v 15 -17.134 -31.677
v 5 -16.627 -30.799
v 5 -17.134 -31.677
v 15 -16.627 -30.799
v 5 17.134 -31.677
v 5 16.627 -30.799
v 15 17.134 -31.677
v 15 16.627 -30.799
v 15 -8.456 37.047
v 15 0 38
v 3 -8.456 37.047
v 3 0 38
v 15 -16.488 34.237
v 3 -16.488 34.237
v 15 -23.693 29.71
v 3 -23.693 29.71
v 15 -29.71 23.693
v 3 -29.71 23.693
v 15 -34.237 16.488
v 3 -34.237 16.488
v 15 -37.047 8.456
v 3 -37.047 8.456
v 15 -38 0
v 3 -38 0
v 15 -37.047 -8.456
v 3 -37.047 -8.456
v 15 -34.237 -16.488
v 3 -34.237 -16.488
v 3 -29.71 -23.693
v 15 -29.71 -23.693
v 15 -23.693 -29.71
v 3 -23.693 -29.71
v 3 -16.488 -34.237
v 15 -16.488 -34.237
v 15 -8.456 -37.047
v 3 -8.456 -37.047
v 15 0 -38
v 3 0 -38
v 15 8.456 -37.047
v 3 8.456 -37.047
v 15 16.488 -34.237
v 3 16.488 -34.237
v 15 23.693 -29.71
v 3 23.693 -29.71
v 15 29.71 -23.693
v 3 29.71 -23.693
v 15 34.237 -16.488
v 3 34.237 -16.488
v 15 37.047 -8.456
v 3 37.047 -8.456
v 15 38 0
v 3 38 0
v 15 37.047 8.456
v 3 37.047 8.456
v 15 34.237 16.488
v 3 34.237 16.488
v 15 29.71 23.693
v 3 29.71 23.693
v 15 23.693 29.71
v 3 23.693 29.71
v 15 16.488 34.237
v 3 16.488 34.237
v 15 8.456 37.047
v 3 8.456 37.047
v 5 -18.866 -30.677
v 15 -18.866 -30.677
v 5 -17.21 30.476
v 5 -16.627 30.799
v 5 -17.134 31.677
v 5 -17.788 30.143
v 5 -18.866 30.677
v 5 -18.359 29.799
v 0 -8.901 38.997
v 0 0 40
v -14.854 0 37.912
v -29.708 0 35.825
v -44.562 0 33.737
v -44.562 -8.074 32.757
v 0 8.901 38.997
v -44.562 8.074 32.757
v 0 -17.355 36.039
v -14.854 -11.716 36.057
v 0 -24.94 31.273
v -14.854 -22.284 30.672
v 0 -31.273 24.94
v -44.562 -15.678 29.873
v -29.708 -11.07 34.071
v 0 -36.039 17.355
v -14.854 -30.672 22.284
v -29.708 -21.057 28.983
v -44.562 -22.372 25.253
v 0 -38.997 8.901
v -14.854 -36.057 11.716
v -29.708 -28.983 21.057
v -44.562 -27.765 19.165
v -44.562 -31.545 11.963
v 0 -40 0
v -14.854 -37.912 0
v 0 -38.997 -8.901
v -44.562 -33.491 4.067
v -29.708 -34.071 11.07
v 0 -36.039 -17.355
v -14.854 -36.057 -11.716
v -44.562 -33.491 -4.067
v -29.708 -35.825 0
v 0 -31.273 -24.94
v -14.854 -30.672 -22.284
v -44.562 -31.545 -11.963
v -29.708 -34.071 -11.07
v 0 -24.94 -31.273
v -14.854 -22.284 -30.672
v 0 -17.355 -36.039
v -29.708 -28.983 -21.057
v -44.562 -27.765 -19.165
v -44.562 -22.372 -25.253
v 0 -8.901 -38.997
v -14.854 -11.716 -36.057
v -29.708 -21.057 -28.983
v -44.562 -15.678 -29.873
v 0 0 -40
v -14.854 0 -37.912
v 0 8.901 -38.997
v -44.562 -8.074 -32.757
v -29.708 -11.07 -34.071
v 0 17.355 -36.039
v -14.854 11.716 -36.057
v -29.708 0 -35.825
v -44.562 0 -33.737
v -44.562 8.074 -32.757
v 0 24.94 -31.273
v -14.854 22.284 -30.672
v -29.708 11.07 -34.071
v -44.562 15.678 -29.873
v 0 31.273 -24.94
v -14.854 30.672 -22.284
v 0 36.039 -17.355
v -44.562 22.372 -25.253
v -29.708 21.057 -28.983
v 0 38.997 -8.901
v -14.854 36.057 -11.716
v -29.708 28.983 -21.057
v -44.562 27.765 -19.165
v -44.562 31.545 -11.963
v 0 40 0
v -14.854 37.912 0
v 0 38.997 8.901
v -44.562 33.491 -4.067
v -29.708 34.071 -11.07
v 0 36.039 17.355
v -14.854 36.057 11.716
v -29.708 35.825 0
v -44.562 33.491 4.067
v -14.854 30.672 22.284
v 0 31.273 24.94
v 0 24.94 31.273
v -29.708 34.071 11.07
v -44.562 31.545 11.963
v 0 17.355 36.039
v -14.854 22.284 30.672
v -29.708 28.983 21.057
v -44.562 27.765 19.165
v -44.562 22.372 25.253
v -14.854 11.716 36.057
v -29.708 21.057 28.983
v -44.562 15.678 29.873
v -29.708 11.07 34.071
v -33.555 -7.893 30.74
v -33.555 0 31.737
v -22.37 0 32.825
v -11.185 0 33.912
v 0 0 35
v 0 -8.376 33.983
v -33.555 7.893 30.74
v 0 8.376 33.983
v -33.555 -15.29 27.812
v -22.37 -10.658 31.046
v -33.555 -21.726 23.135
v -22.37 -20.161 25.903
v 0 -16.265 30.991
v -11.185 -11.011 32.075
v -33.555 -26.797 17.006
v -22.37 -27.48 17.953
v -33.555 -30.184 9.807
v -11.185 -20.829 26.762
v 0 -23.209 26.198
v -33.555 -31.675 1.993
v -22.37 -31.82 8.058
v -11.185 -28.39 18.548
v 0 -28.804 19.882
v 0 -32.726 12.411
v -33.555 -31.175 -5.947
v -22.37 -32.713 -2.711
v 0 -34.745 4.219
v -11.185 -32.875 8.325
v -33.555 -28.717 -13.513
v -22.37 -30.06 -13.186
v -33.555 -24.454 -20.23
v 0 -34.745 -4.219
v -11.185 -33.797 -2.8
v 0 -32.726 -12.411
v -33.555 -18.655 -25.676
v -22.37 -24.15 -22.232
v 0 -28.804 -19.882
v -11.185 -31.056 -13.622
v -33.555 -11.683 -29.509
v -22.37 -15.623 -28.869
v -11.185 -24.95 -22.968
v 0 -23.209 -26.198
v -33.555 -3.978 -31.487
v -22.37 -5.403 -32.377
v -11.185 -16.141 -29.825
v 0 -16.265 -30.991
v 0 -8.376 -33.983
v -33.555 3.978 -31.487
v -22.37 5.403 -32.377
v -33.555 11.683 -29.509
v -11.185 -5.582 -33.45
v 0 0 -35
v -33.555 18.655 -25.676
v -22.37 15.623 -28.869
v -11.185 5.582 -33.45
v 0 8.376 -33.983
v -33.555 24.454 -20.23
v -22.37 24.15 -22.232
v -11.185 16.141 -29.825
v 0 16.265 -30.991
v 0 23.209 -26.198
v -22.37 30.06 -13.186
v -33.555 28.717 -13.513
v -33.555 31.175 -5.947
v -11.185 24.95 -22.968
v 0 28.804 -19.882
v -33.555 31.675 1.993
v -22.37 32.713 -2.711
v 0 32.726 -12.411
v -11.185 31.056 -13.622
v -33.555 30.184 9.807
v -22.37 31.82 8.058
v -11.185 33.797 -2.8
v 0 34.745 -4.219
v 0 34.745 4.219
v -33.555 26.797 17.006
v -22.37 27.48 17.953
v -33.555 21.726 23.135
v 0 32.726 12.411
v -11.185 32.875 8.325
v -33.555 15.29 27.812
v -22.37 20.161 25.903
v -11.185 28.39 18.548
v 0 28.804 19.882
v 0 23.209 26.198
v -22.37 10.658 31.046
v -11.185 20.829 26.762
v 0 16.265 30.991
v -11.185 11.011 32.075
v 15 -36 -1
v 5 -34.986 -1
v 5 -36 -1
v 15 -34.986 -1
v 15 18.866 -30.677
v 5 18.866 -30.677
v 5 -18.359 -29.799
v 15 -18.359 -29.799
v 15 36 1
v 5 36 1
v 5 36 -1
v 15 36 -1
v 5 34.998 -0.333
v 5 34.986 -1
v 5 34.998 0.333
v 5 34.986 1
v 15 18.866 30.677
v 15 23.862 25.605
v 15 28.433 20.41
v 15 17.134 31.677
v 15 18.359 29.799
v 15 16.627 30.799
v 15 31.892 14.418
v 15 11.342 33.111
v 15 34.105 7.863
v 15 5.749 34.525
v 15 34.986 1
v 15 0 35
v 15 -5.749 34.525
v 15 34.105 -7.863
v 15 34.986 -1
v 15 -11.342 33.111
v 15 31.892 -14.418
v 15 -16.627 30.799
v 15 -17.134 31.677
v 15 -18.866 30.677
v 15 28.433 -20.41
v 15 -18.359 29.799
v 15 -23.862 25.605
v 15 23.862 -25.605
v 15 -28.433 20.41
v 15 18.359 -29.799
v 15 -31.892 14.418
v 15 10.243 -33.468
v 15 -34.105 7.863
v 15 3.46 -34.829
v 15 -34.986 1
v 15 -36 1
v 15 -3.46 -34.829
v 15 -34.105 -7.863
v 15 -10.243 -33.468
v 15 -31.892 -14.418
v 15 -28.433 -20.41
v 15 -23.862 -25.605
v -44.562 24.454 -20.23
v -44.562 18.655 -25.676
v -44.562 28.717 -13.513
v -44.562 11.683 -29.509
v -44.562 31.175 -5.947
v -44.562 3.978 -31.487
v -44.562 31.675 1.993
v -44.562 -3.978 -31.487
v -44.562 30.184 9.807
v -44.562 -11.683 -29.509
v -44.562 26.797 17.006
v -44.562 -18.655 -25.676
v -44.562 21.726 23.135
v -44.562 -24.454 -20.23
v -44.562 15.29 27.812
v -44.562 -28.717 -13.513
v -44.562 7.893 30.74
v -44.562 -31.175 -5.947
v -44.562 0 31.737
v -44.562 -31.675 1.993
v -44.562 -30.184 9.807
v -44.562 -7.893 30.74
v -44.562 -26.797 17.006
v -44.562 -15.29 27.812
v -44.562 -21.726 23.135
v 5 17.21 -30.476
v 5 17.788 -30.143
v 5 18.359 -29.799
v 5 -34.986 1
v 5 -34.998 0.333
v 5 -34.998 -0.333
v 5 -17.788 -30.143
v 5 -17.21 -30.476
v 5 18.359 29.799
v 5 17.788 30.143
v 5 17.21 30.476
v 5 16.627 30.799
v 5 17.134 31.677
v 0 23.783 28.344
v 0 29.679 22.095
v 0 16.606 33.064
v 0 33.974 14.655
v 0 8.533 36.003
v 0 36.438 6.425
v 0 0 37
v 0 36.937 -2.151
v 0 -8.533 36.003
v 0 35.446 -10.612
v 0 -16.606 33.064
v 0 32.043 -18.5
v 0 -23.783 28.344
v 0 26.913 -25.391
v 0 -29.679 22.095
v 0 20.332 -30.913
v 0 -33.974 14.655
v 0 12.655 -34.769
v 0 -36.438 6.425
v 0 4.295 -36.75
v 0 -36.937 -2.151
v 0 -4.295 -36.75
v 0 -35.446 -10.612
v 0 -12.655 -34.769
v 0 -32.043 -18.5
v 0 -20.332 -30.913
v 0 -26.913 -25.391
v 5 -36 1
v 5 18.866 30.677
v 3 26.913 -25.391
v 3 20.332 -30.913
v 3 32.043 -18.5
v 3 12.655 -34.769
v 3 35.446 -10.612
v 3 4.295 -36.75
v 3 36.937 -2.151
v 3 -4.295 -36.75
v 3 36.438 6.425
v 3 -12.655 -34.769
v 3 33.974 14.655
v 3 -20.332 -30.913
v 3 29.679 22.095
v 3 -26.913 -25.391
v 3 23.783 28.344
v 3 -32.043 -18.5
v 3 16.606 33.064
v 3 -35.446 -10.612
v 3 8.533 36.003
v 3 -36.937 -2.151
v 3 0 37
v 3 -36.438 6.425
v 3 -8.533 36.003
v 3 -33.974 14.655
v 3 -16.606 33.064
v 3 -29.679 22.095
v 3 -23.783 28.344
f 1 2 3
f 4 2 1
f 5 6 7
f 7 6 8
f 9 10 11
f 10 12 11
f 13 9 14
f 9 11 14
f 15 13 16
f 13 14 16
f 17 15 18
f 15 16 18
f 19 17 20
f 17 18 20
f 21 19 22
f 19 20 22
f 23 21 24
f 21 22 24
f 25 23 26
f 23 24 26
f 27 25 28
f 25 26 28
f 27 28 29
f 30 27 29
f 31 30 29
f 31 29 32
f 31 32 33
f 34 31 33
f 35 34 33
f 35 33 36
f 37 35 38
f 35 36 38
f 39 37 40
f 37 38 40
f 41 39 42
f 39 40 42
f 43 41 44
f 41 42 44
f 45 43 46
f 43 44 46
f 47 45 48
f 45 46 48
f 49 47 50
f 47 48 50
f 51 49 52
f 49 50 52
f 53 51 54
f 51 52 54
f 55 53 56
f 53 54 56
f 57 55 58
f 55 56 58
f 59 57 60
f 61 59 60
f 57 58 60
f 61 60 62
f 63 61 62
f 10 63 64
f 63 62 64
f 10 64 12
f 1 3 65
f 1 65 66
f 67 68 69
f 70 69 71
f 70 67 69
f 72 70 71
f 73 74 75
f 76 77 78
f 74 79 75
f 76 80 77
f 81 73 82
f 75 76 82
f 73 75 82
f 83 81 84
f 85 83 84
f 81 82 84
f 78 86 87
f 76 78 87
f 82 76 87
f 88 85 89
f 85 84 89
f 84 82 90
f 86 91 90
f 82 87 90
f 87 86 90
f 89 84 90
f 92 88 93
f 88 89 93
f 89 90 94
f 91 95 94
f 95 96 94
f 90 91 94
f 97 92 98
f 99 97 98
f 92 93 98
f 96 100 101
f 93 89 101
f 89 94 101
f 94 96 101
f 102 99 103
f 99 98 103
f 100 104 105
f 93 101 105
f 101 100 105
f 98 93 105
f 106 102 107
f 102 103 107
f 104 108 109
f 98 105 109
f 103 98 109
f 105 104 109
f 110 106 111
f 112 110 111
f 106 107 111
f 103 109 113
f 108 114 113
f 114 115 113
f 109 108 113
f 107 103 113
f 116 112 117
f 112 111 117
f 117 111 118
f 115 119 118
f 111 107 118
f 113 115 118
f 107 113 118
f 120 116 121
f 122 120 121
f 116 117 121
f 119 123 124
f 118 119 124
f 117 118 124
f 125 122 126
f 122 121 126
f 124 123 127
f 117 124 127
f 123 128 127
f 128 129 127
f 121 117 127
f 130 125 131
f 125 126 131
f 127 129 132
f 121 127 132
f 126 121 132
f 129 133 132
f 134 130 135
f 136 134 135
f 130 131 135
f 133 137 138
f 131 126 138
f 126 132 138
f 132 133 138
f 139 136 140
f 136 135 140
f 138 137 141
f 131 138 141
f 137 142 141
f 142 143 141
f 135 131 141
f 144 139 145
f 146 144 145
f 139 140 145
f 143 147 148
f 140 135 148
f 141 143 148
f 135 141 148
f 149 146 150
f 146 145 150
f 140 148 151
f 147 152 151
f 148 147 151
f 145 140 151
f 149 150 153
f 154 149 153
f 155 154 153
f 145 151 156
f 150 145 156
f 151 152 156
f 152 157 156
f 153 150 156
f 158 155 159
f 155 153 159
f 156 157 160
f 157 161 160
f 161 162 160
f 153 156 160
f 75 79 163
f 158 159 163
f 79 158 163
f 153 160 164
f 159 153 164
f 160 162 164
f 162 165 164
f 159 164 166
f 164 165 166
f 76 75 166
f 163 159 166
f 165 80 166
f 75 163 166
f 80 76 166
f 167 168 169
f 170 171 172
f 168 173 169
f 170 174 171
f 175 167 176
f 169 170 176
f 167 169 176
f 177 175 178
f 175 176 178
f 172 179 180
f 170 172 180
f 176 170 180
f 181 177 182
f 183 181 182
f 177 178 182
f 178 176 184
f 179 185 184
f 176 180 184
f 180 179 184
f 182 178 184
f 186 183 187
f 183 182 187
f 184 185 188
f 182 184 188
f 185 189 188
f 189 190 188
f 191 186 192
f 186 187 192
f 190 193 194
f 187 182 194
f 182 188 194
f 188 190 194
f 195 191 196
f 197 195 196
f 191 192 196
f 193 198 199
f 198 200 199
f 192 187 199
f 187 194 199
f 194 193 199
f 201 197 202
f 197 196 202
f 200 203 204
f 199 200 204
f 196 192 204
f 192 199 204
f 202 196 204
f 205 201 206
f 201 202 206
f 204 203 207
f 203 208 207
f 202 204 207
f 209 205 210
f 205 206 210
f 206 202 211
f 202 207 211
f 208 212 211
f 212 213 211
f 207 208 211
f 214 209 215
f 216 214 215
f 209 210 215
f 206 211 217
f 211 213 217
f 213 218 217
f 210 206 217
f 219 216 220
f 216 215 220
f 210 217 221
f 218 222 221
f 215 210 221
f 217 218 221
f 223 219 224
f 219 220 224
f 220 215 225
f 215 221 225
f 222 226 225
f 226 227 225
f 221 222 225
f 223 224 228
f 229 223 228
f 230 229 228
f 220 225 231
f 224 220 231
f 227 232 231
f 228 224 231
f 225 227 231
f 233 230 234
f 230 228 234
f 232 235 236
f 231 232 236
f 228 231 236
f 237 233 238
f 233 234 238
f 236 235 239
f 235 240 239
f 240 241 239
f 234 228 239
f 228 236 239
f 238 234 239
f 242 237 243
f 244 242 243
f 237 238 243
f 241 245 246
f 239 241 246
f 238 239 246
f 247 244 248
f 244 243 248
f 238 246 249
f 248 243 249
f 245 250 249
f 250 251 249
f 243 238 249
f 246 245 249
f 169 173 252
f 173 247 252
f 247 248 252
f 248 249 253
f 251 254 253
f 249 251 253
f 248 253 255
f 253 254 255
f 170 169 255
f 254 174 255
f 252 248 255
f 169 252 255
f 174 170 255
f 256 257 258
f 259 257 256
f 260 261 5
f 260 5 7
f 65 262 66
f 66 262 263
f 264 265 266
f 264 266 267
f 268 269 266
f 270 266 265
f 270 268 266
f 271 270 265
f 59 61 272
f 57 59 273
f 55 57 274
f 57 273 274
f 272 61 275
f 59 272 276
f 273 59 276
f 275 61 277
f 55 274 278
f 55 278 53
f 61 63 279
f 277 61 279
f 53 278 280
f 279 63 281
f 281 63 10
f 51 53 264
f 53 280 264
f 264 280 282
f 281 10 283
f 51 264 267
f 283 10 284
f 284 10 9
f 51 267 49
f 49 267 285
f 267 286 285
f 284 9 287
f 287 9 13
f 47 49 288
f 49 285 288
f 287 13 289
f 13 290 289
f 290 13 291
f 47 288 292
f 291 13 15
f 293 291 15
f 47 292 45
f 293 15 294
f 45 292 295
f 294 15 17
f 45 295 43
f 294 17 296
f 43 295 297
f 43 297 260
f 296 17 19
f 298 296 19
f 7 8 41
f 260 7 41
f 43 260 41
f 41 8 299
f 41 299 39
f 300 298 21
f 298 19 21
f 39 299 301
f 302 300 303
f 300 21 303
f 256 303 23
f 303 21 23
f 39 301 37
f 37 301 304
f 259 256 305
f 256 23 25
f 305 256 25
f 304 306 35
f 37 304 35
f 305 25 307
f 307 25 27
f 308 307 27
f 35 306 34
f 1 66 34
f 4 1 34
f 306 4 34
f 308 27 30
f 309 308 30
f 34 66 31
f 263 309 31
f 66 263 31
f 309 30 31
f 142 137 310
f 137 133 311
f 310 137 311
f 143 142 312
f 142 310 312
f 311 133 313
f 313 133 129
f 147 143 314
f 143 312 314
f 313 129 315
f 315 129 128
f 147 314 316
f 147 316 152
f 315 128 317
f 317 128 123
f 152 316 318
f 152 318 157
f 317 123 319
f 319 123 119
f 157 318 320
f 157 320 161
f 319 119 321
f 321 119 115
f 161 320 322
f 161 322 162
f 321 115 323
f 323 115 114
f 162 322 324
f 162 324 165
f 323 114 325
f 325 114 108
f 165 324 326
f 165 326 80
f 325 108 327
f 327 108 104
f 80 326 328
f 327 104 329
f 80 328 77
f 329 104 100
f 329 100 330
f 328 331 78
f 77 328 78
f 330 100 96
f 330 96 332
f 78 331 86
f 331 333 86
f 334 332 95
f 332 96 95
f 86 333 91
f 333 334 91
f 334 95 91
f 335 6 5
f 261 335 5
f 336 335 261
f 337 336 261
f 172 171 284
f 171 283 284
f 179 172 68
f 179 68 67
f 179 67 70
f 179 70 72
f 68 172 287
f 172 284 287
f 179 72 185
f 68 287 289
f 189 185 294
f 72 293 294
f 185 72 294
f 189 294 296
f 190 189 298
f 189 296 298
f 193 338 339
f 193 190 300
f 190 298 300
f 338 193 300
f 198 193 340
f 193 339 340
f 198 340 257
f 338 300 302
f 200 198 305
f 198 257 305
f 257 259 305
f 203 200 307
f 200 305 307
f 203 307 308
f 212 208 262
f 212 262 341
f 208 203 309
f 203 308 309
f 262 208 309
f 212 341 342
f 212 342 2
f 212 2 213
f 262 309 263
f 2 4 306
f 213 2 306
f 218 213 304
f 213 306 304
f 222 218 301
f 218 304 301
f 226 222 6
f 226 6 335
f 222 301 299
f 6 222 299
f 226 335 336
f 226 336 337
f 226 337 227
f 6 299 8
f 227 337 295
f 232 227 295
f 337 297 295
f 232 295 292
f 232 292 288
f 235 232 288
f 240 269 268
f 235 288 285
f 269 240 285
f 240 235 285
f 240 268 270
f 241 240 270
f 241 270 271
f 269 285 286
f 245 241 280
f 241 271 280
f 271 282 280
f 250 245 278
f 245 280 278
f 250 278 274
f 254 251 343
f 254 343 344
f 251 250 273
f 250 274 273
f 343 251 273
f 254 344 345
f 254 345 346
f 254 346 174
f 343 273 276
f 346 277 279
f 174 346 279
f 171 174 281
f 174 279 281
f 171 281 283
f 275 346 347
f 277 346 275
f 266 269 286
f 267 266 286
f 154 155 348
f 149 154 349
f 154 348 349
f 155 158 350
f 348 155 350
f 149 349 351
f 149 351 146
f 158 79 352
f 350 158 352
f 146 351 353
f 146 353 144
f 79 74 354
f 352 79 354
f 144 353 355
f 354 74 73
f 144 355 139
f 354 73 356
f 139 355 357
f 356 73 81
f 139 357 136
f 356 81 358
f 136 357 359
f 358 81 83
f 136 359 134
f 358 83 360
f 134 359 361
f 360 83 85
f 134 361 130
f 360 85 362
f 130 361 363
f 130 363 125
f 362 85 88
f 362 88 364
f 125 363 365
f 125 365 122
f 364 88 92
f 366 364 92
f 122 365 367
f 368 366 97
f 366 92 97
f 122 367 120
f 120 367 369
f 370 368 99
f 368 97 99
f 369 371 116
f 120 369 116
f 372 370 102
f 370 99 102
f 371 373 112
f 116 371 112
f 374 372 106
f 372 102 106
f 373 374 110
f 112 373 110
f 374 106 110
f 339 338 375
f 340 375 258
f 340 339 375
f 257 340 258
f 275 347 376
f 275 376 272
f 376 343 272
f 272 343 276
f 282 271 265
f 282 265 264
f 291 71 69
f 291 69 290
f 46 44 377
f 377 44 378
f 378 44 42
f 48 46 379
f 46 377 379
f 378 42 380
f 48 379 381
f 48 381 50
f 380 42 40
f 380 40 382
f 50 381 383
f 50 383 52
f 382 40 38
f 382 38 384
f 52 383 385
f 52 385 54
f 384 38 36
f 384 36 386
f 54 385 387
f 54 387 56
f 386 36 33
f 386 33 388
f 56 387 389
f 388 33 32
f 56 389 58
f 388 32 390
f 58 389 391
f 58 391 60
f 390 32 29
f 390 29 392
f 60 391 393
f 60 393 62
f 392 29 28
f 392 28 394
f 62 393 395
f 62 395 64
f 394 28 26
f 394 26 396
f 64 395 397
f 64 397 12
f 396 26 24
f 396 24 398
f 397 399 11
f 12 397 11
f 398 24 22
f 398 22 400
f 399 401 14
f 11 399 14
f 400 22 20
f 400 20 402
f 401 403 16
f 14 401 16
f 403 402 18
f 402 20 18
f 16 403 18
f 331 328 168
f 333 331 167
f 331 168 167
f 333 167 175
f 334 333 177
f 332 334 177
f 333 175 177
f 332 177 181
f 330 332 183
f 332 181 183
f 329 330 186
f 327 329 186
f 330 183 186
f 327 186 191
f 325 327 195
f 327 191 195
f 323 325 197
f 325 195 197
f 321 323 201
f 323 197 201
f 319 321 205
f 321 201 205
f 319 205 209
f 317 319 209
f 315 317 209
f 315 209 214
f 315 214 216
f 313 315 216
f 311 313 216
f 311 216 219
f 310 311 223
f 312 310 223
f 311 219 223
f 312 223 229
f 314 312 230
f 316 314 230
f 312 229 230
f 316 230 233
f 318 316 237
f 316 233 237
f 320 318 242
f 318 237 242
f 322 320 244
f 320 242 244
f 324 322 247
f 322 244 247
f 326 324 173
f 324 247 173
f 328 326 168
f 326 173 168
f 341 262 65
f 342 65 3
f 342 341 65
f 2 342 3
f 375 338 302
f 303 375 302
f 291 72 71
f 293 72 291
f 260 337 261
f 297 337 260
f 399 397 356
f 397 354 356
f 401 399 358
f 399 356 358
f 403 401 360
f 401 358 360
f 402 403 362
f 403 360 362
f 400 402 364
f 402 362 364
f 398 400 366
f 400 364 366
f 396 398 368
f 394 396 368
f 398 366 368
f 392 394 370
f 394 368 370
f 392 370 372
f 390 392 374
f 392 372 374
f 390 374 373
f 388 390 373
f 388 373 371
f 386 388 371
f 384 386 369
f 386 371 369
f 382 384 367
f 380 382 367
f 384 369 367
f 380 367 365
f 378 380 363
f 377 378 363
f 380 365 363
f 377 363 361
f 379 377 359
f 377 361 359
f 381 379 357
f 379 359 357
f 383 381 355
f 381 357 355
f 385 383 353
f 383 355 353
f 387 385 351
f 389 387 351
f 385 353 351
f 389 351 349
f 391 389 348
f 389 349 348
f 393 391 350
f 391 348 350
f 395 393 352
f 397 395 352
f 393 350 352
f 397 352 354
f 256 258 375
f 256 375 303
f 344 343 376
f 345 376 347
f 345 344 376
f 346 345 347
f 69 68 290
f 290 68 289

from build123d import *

# Parameters (mm, degrees)
IZIM3_W                 = 10
IZIM3_H                 = 2
KES_EKSTR_ZYON1_DEPTH   = 36
DAIRESEL_KAPLAMA1_COUNT = 6


with BuildPart() as part:
    # Çizim1 → Döndür2 (revolve)
    with BuildSketch(Plane.XY):
        Polygon((0, 40), (-44.562063093, 33.737210457), (-44.562063093, 31.737210457), (-33.555064496, 31.737210457), (0, 35), (15, 35), (15, 38), (3, 38), (3, 37), (0, 37), align=None)
    revolve(axis=Axis((-44.316348886, 0, 0), (1, 0, 0)))

    # Çizim3 → Kes-Ekstrüzyon1 (cut)
    with BuildSketch(Plane(origin=(0, 0, 0), x_dir=(1, 0, 0), z_dir=(0, 1, 0))):
        with Locations((10, 0)):
            Rectangle(IZIM3_W, IZIM3_H)
    kes_ekstr_zyon1 = extrude(amount=-KES_EKSTR_ZYON1_DEPTH, mode=Mode.SUBTRACT)

    # Dairesel Kaplama1: Kes-Ekstrüzyon1 ×6 about axis
    dairesel_kaplama1_axis = Axis((0, 0, 0), (-1, 0, 0))
    for i in range(1, DAIRESEL_KAPLAMA1_COUNT):
        add(kes_ekstr_zyon1.rotate(dairesel_kaplama1_axis, i * 360 / DAIRESEL_KAPLAMA1_COUNT), mode=Mode.SUBTRACT)


solid = part.part
